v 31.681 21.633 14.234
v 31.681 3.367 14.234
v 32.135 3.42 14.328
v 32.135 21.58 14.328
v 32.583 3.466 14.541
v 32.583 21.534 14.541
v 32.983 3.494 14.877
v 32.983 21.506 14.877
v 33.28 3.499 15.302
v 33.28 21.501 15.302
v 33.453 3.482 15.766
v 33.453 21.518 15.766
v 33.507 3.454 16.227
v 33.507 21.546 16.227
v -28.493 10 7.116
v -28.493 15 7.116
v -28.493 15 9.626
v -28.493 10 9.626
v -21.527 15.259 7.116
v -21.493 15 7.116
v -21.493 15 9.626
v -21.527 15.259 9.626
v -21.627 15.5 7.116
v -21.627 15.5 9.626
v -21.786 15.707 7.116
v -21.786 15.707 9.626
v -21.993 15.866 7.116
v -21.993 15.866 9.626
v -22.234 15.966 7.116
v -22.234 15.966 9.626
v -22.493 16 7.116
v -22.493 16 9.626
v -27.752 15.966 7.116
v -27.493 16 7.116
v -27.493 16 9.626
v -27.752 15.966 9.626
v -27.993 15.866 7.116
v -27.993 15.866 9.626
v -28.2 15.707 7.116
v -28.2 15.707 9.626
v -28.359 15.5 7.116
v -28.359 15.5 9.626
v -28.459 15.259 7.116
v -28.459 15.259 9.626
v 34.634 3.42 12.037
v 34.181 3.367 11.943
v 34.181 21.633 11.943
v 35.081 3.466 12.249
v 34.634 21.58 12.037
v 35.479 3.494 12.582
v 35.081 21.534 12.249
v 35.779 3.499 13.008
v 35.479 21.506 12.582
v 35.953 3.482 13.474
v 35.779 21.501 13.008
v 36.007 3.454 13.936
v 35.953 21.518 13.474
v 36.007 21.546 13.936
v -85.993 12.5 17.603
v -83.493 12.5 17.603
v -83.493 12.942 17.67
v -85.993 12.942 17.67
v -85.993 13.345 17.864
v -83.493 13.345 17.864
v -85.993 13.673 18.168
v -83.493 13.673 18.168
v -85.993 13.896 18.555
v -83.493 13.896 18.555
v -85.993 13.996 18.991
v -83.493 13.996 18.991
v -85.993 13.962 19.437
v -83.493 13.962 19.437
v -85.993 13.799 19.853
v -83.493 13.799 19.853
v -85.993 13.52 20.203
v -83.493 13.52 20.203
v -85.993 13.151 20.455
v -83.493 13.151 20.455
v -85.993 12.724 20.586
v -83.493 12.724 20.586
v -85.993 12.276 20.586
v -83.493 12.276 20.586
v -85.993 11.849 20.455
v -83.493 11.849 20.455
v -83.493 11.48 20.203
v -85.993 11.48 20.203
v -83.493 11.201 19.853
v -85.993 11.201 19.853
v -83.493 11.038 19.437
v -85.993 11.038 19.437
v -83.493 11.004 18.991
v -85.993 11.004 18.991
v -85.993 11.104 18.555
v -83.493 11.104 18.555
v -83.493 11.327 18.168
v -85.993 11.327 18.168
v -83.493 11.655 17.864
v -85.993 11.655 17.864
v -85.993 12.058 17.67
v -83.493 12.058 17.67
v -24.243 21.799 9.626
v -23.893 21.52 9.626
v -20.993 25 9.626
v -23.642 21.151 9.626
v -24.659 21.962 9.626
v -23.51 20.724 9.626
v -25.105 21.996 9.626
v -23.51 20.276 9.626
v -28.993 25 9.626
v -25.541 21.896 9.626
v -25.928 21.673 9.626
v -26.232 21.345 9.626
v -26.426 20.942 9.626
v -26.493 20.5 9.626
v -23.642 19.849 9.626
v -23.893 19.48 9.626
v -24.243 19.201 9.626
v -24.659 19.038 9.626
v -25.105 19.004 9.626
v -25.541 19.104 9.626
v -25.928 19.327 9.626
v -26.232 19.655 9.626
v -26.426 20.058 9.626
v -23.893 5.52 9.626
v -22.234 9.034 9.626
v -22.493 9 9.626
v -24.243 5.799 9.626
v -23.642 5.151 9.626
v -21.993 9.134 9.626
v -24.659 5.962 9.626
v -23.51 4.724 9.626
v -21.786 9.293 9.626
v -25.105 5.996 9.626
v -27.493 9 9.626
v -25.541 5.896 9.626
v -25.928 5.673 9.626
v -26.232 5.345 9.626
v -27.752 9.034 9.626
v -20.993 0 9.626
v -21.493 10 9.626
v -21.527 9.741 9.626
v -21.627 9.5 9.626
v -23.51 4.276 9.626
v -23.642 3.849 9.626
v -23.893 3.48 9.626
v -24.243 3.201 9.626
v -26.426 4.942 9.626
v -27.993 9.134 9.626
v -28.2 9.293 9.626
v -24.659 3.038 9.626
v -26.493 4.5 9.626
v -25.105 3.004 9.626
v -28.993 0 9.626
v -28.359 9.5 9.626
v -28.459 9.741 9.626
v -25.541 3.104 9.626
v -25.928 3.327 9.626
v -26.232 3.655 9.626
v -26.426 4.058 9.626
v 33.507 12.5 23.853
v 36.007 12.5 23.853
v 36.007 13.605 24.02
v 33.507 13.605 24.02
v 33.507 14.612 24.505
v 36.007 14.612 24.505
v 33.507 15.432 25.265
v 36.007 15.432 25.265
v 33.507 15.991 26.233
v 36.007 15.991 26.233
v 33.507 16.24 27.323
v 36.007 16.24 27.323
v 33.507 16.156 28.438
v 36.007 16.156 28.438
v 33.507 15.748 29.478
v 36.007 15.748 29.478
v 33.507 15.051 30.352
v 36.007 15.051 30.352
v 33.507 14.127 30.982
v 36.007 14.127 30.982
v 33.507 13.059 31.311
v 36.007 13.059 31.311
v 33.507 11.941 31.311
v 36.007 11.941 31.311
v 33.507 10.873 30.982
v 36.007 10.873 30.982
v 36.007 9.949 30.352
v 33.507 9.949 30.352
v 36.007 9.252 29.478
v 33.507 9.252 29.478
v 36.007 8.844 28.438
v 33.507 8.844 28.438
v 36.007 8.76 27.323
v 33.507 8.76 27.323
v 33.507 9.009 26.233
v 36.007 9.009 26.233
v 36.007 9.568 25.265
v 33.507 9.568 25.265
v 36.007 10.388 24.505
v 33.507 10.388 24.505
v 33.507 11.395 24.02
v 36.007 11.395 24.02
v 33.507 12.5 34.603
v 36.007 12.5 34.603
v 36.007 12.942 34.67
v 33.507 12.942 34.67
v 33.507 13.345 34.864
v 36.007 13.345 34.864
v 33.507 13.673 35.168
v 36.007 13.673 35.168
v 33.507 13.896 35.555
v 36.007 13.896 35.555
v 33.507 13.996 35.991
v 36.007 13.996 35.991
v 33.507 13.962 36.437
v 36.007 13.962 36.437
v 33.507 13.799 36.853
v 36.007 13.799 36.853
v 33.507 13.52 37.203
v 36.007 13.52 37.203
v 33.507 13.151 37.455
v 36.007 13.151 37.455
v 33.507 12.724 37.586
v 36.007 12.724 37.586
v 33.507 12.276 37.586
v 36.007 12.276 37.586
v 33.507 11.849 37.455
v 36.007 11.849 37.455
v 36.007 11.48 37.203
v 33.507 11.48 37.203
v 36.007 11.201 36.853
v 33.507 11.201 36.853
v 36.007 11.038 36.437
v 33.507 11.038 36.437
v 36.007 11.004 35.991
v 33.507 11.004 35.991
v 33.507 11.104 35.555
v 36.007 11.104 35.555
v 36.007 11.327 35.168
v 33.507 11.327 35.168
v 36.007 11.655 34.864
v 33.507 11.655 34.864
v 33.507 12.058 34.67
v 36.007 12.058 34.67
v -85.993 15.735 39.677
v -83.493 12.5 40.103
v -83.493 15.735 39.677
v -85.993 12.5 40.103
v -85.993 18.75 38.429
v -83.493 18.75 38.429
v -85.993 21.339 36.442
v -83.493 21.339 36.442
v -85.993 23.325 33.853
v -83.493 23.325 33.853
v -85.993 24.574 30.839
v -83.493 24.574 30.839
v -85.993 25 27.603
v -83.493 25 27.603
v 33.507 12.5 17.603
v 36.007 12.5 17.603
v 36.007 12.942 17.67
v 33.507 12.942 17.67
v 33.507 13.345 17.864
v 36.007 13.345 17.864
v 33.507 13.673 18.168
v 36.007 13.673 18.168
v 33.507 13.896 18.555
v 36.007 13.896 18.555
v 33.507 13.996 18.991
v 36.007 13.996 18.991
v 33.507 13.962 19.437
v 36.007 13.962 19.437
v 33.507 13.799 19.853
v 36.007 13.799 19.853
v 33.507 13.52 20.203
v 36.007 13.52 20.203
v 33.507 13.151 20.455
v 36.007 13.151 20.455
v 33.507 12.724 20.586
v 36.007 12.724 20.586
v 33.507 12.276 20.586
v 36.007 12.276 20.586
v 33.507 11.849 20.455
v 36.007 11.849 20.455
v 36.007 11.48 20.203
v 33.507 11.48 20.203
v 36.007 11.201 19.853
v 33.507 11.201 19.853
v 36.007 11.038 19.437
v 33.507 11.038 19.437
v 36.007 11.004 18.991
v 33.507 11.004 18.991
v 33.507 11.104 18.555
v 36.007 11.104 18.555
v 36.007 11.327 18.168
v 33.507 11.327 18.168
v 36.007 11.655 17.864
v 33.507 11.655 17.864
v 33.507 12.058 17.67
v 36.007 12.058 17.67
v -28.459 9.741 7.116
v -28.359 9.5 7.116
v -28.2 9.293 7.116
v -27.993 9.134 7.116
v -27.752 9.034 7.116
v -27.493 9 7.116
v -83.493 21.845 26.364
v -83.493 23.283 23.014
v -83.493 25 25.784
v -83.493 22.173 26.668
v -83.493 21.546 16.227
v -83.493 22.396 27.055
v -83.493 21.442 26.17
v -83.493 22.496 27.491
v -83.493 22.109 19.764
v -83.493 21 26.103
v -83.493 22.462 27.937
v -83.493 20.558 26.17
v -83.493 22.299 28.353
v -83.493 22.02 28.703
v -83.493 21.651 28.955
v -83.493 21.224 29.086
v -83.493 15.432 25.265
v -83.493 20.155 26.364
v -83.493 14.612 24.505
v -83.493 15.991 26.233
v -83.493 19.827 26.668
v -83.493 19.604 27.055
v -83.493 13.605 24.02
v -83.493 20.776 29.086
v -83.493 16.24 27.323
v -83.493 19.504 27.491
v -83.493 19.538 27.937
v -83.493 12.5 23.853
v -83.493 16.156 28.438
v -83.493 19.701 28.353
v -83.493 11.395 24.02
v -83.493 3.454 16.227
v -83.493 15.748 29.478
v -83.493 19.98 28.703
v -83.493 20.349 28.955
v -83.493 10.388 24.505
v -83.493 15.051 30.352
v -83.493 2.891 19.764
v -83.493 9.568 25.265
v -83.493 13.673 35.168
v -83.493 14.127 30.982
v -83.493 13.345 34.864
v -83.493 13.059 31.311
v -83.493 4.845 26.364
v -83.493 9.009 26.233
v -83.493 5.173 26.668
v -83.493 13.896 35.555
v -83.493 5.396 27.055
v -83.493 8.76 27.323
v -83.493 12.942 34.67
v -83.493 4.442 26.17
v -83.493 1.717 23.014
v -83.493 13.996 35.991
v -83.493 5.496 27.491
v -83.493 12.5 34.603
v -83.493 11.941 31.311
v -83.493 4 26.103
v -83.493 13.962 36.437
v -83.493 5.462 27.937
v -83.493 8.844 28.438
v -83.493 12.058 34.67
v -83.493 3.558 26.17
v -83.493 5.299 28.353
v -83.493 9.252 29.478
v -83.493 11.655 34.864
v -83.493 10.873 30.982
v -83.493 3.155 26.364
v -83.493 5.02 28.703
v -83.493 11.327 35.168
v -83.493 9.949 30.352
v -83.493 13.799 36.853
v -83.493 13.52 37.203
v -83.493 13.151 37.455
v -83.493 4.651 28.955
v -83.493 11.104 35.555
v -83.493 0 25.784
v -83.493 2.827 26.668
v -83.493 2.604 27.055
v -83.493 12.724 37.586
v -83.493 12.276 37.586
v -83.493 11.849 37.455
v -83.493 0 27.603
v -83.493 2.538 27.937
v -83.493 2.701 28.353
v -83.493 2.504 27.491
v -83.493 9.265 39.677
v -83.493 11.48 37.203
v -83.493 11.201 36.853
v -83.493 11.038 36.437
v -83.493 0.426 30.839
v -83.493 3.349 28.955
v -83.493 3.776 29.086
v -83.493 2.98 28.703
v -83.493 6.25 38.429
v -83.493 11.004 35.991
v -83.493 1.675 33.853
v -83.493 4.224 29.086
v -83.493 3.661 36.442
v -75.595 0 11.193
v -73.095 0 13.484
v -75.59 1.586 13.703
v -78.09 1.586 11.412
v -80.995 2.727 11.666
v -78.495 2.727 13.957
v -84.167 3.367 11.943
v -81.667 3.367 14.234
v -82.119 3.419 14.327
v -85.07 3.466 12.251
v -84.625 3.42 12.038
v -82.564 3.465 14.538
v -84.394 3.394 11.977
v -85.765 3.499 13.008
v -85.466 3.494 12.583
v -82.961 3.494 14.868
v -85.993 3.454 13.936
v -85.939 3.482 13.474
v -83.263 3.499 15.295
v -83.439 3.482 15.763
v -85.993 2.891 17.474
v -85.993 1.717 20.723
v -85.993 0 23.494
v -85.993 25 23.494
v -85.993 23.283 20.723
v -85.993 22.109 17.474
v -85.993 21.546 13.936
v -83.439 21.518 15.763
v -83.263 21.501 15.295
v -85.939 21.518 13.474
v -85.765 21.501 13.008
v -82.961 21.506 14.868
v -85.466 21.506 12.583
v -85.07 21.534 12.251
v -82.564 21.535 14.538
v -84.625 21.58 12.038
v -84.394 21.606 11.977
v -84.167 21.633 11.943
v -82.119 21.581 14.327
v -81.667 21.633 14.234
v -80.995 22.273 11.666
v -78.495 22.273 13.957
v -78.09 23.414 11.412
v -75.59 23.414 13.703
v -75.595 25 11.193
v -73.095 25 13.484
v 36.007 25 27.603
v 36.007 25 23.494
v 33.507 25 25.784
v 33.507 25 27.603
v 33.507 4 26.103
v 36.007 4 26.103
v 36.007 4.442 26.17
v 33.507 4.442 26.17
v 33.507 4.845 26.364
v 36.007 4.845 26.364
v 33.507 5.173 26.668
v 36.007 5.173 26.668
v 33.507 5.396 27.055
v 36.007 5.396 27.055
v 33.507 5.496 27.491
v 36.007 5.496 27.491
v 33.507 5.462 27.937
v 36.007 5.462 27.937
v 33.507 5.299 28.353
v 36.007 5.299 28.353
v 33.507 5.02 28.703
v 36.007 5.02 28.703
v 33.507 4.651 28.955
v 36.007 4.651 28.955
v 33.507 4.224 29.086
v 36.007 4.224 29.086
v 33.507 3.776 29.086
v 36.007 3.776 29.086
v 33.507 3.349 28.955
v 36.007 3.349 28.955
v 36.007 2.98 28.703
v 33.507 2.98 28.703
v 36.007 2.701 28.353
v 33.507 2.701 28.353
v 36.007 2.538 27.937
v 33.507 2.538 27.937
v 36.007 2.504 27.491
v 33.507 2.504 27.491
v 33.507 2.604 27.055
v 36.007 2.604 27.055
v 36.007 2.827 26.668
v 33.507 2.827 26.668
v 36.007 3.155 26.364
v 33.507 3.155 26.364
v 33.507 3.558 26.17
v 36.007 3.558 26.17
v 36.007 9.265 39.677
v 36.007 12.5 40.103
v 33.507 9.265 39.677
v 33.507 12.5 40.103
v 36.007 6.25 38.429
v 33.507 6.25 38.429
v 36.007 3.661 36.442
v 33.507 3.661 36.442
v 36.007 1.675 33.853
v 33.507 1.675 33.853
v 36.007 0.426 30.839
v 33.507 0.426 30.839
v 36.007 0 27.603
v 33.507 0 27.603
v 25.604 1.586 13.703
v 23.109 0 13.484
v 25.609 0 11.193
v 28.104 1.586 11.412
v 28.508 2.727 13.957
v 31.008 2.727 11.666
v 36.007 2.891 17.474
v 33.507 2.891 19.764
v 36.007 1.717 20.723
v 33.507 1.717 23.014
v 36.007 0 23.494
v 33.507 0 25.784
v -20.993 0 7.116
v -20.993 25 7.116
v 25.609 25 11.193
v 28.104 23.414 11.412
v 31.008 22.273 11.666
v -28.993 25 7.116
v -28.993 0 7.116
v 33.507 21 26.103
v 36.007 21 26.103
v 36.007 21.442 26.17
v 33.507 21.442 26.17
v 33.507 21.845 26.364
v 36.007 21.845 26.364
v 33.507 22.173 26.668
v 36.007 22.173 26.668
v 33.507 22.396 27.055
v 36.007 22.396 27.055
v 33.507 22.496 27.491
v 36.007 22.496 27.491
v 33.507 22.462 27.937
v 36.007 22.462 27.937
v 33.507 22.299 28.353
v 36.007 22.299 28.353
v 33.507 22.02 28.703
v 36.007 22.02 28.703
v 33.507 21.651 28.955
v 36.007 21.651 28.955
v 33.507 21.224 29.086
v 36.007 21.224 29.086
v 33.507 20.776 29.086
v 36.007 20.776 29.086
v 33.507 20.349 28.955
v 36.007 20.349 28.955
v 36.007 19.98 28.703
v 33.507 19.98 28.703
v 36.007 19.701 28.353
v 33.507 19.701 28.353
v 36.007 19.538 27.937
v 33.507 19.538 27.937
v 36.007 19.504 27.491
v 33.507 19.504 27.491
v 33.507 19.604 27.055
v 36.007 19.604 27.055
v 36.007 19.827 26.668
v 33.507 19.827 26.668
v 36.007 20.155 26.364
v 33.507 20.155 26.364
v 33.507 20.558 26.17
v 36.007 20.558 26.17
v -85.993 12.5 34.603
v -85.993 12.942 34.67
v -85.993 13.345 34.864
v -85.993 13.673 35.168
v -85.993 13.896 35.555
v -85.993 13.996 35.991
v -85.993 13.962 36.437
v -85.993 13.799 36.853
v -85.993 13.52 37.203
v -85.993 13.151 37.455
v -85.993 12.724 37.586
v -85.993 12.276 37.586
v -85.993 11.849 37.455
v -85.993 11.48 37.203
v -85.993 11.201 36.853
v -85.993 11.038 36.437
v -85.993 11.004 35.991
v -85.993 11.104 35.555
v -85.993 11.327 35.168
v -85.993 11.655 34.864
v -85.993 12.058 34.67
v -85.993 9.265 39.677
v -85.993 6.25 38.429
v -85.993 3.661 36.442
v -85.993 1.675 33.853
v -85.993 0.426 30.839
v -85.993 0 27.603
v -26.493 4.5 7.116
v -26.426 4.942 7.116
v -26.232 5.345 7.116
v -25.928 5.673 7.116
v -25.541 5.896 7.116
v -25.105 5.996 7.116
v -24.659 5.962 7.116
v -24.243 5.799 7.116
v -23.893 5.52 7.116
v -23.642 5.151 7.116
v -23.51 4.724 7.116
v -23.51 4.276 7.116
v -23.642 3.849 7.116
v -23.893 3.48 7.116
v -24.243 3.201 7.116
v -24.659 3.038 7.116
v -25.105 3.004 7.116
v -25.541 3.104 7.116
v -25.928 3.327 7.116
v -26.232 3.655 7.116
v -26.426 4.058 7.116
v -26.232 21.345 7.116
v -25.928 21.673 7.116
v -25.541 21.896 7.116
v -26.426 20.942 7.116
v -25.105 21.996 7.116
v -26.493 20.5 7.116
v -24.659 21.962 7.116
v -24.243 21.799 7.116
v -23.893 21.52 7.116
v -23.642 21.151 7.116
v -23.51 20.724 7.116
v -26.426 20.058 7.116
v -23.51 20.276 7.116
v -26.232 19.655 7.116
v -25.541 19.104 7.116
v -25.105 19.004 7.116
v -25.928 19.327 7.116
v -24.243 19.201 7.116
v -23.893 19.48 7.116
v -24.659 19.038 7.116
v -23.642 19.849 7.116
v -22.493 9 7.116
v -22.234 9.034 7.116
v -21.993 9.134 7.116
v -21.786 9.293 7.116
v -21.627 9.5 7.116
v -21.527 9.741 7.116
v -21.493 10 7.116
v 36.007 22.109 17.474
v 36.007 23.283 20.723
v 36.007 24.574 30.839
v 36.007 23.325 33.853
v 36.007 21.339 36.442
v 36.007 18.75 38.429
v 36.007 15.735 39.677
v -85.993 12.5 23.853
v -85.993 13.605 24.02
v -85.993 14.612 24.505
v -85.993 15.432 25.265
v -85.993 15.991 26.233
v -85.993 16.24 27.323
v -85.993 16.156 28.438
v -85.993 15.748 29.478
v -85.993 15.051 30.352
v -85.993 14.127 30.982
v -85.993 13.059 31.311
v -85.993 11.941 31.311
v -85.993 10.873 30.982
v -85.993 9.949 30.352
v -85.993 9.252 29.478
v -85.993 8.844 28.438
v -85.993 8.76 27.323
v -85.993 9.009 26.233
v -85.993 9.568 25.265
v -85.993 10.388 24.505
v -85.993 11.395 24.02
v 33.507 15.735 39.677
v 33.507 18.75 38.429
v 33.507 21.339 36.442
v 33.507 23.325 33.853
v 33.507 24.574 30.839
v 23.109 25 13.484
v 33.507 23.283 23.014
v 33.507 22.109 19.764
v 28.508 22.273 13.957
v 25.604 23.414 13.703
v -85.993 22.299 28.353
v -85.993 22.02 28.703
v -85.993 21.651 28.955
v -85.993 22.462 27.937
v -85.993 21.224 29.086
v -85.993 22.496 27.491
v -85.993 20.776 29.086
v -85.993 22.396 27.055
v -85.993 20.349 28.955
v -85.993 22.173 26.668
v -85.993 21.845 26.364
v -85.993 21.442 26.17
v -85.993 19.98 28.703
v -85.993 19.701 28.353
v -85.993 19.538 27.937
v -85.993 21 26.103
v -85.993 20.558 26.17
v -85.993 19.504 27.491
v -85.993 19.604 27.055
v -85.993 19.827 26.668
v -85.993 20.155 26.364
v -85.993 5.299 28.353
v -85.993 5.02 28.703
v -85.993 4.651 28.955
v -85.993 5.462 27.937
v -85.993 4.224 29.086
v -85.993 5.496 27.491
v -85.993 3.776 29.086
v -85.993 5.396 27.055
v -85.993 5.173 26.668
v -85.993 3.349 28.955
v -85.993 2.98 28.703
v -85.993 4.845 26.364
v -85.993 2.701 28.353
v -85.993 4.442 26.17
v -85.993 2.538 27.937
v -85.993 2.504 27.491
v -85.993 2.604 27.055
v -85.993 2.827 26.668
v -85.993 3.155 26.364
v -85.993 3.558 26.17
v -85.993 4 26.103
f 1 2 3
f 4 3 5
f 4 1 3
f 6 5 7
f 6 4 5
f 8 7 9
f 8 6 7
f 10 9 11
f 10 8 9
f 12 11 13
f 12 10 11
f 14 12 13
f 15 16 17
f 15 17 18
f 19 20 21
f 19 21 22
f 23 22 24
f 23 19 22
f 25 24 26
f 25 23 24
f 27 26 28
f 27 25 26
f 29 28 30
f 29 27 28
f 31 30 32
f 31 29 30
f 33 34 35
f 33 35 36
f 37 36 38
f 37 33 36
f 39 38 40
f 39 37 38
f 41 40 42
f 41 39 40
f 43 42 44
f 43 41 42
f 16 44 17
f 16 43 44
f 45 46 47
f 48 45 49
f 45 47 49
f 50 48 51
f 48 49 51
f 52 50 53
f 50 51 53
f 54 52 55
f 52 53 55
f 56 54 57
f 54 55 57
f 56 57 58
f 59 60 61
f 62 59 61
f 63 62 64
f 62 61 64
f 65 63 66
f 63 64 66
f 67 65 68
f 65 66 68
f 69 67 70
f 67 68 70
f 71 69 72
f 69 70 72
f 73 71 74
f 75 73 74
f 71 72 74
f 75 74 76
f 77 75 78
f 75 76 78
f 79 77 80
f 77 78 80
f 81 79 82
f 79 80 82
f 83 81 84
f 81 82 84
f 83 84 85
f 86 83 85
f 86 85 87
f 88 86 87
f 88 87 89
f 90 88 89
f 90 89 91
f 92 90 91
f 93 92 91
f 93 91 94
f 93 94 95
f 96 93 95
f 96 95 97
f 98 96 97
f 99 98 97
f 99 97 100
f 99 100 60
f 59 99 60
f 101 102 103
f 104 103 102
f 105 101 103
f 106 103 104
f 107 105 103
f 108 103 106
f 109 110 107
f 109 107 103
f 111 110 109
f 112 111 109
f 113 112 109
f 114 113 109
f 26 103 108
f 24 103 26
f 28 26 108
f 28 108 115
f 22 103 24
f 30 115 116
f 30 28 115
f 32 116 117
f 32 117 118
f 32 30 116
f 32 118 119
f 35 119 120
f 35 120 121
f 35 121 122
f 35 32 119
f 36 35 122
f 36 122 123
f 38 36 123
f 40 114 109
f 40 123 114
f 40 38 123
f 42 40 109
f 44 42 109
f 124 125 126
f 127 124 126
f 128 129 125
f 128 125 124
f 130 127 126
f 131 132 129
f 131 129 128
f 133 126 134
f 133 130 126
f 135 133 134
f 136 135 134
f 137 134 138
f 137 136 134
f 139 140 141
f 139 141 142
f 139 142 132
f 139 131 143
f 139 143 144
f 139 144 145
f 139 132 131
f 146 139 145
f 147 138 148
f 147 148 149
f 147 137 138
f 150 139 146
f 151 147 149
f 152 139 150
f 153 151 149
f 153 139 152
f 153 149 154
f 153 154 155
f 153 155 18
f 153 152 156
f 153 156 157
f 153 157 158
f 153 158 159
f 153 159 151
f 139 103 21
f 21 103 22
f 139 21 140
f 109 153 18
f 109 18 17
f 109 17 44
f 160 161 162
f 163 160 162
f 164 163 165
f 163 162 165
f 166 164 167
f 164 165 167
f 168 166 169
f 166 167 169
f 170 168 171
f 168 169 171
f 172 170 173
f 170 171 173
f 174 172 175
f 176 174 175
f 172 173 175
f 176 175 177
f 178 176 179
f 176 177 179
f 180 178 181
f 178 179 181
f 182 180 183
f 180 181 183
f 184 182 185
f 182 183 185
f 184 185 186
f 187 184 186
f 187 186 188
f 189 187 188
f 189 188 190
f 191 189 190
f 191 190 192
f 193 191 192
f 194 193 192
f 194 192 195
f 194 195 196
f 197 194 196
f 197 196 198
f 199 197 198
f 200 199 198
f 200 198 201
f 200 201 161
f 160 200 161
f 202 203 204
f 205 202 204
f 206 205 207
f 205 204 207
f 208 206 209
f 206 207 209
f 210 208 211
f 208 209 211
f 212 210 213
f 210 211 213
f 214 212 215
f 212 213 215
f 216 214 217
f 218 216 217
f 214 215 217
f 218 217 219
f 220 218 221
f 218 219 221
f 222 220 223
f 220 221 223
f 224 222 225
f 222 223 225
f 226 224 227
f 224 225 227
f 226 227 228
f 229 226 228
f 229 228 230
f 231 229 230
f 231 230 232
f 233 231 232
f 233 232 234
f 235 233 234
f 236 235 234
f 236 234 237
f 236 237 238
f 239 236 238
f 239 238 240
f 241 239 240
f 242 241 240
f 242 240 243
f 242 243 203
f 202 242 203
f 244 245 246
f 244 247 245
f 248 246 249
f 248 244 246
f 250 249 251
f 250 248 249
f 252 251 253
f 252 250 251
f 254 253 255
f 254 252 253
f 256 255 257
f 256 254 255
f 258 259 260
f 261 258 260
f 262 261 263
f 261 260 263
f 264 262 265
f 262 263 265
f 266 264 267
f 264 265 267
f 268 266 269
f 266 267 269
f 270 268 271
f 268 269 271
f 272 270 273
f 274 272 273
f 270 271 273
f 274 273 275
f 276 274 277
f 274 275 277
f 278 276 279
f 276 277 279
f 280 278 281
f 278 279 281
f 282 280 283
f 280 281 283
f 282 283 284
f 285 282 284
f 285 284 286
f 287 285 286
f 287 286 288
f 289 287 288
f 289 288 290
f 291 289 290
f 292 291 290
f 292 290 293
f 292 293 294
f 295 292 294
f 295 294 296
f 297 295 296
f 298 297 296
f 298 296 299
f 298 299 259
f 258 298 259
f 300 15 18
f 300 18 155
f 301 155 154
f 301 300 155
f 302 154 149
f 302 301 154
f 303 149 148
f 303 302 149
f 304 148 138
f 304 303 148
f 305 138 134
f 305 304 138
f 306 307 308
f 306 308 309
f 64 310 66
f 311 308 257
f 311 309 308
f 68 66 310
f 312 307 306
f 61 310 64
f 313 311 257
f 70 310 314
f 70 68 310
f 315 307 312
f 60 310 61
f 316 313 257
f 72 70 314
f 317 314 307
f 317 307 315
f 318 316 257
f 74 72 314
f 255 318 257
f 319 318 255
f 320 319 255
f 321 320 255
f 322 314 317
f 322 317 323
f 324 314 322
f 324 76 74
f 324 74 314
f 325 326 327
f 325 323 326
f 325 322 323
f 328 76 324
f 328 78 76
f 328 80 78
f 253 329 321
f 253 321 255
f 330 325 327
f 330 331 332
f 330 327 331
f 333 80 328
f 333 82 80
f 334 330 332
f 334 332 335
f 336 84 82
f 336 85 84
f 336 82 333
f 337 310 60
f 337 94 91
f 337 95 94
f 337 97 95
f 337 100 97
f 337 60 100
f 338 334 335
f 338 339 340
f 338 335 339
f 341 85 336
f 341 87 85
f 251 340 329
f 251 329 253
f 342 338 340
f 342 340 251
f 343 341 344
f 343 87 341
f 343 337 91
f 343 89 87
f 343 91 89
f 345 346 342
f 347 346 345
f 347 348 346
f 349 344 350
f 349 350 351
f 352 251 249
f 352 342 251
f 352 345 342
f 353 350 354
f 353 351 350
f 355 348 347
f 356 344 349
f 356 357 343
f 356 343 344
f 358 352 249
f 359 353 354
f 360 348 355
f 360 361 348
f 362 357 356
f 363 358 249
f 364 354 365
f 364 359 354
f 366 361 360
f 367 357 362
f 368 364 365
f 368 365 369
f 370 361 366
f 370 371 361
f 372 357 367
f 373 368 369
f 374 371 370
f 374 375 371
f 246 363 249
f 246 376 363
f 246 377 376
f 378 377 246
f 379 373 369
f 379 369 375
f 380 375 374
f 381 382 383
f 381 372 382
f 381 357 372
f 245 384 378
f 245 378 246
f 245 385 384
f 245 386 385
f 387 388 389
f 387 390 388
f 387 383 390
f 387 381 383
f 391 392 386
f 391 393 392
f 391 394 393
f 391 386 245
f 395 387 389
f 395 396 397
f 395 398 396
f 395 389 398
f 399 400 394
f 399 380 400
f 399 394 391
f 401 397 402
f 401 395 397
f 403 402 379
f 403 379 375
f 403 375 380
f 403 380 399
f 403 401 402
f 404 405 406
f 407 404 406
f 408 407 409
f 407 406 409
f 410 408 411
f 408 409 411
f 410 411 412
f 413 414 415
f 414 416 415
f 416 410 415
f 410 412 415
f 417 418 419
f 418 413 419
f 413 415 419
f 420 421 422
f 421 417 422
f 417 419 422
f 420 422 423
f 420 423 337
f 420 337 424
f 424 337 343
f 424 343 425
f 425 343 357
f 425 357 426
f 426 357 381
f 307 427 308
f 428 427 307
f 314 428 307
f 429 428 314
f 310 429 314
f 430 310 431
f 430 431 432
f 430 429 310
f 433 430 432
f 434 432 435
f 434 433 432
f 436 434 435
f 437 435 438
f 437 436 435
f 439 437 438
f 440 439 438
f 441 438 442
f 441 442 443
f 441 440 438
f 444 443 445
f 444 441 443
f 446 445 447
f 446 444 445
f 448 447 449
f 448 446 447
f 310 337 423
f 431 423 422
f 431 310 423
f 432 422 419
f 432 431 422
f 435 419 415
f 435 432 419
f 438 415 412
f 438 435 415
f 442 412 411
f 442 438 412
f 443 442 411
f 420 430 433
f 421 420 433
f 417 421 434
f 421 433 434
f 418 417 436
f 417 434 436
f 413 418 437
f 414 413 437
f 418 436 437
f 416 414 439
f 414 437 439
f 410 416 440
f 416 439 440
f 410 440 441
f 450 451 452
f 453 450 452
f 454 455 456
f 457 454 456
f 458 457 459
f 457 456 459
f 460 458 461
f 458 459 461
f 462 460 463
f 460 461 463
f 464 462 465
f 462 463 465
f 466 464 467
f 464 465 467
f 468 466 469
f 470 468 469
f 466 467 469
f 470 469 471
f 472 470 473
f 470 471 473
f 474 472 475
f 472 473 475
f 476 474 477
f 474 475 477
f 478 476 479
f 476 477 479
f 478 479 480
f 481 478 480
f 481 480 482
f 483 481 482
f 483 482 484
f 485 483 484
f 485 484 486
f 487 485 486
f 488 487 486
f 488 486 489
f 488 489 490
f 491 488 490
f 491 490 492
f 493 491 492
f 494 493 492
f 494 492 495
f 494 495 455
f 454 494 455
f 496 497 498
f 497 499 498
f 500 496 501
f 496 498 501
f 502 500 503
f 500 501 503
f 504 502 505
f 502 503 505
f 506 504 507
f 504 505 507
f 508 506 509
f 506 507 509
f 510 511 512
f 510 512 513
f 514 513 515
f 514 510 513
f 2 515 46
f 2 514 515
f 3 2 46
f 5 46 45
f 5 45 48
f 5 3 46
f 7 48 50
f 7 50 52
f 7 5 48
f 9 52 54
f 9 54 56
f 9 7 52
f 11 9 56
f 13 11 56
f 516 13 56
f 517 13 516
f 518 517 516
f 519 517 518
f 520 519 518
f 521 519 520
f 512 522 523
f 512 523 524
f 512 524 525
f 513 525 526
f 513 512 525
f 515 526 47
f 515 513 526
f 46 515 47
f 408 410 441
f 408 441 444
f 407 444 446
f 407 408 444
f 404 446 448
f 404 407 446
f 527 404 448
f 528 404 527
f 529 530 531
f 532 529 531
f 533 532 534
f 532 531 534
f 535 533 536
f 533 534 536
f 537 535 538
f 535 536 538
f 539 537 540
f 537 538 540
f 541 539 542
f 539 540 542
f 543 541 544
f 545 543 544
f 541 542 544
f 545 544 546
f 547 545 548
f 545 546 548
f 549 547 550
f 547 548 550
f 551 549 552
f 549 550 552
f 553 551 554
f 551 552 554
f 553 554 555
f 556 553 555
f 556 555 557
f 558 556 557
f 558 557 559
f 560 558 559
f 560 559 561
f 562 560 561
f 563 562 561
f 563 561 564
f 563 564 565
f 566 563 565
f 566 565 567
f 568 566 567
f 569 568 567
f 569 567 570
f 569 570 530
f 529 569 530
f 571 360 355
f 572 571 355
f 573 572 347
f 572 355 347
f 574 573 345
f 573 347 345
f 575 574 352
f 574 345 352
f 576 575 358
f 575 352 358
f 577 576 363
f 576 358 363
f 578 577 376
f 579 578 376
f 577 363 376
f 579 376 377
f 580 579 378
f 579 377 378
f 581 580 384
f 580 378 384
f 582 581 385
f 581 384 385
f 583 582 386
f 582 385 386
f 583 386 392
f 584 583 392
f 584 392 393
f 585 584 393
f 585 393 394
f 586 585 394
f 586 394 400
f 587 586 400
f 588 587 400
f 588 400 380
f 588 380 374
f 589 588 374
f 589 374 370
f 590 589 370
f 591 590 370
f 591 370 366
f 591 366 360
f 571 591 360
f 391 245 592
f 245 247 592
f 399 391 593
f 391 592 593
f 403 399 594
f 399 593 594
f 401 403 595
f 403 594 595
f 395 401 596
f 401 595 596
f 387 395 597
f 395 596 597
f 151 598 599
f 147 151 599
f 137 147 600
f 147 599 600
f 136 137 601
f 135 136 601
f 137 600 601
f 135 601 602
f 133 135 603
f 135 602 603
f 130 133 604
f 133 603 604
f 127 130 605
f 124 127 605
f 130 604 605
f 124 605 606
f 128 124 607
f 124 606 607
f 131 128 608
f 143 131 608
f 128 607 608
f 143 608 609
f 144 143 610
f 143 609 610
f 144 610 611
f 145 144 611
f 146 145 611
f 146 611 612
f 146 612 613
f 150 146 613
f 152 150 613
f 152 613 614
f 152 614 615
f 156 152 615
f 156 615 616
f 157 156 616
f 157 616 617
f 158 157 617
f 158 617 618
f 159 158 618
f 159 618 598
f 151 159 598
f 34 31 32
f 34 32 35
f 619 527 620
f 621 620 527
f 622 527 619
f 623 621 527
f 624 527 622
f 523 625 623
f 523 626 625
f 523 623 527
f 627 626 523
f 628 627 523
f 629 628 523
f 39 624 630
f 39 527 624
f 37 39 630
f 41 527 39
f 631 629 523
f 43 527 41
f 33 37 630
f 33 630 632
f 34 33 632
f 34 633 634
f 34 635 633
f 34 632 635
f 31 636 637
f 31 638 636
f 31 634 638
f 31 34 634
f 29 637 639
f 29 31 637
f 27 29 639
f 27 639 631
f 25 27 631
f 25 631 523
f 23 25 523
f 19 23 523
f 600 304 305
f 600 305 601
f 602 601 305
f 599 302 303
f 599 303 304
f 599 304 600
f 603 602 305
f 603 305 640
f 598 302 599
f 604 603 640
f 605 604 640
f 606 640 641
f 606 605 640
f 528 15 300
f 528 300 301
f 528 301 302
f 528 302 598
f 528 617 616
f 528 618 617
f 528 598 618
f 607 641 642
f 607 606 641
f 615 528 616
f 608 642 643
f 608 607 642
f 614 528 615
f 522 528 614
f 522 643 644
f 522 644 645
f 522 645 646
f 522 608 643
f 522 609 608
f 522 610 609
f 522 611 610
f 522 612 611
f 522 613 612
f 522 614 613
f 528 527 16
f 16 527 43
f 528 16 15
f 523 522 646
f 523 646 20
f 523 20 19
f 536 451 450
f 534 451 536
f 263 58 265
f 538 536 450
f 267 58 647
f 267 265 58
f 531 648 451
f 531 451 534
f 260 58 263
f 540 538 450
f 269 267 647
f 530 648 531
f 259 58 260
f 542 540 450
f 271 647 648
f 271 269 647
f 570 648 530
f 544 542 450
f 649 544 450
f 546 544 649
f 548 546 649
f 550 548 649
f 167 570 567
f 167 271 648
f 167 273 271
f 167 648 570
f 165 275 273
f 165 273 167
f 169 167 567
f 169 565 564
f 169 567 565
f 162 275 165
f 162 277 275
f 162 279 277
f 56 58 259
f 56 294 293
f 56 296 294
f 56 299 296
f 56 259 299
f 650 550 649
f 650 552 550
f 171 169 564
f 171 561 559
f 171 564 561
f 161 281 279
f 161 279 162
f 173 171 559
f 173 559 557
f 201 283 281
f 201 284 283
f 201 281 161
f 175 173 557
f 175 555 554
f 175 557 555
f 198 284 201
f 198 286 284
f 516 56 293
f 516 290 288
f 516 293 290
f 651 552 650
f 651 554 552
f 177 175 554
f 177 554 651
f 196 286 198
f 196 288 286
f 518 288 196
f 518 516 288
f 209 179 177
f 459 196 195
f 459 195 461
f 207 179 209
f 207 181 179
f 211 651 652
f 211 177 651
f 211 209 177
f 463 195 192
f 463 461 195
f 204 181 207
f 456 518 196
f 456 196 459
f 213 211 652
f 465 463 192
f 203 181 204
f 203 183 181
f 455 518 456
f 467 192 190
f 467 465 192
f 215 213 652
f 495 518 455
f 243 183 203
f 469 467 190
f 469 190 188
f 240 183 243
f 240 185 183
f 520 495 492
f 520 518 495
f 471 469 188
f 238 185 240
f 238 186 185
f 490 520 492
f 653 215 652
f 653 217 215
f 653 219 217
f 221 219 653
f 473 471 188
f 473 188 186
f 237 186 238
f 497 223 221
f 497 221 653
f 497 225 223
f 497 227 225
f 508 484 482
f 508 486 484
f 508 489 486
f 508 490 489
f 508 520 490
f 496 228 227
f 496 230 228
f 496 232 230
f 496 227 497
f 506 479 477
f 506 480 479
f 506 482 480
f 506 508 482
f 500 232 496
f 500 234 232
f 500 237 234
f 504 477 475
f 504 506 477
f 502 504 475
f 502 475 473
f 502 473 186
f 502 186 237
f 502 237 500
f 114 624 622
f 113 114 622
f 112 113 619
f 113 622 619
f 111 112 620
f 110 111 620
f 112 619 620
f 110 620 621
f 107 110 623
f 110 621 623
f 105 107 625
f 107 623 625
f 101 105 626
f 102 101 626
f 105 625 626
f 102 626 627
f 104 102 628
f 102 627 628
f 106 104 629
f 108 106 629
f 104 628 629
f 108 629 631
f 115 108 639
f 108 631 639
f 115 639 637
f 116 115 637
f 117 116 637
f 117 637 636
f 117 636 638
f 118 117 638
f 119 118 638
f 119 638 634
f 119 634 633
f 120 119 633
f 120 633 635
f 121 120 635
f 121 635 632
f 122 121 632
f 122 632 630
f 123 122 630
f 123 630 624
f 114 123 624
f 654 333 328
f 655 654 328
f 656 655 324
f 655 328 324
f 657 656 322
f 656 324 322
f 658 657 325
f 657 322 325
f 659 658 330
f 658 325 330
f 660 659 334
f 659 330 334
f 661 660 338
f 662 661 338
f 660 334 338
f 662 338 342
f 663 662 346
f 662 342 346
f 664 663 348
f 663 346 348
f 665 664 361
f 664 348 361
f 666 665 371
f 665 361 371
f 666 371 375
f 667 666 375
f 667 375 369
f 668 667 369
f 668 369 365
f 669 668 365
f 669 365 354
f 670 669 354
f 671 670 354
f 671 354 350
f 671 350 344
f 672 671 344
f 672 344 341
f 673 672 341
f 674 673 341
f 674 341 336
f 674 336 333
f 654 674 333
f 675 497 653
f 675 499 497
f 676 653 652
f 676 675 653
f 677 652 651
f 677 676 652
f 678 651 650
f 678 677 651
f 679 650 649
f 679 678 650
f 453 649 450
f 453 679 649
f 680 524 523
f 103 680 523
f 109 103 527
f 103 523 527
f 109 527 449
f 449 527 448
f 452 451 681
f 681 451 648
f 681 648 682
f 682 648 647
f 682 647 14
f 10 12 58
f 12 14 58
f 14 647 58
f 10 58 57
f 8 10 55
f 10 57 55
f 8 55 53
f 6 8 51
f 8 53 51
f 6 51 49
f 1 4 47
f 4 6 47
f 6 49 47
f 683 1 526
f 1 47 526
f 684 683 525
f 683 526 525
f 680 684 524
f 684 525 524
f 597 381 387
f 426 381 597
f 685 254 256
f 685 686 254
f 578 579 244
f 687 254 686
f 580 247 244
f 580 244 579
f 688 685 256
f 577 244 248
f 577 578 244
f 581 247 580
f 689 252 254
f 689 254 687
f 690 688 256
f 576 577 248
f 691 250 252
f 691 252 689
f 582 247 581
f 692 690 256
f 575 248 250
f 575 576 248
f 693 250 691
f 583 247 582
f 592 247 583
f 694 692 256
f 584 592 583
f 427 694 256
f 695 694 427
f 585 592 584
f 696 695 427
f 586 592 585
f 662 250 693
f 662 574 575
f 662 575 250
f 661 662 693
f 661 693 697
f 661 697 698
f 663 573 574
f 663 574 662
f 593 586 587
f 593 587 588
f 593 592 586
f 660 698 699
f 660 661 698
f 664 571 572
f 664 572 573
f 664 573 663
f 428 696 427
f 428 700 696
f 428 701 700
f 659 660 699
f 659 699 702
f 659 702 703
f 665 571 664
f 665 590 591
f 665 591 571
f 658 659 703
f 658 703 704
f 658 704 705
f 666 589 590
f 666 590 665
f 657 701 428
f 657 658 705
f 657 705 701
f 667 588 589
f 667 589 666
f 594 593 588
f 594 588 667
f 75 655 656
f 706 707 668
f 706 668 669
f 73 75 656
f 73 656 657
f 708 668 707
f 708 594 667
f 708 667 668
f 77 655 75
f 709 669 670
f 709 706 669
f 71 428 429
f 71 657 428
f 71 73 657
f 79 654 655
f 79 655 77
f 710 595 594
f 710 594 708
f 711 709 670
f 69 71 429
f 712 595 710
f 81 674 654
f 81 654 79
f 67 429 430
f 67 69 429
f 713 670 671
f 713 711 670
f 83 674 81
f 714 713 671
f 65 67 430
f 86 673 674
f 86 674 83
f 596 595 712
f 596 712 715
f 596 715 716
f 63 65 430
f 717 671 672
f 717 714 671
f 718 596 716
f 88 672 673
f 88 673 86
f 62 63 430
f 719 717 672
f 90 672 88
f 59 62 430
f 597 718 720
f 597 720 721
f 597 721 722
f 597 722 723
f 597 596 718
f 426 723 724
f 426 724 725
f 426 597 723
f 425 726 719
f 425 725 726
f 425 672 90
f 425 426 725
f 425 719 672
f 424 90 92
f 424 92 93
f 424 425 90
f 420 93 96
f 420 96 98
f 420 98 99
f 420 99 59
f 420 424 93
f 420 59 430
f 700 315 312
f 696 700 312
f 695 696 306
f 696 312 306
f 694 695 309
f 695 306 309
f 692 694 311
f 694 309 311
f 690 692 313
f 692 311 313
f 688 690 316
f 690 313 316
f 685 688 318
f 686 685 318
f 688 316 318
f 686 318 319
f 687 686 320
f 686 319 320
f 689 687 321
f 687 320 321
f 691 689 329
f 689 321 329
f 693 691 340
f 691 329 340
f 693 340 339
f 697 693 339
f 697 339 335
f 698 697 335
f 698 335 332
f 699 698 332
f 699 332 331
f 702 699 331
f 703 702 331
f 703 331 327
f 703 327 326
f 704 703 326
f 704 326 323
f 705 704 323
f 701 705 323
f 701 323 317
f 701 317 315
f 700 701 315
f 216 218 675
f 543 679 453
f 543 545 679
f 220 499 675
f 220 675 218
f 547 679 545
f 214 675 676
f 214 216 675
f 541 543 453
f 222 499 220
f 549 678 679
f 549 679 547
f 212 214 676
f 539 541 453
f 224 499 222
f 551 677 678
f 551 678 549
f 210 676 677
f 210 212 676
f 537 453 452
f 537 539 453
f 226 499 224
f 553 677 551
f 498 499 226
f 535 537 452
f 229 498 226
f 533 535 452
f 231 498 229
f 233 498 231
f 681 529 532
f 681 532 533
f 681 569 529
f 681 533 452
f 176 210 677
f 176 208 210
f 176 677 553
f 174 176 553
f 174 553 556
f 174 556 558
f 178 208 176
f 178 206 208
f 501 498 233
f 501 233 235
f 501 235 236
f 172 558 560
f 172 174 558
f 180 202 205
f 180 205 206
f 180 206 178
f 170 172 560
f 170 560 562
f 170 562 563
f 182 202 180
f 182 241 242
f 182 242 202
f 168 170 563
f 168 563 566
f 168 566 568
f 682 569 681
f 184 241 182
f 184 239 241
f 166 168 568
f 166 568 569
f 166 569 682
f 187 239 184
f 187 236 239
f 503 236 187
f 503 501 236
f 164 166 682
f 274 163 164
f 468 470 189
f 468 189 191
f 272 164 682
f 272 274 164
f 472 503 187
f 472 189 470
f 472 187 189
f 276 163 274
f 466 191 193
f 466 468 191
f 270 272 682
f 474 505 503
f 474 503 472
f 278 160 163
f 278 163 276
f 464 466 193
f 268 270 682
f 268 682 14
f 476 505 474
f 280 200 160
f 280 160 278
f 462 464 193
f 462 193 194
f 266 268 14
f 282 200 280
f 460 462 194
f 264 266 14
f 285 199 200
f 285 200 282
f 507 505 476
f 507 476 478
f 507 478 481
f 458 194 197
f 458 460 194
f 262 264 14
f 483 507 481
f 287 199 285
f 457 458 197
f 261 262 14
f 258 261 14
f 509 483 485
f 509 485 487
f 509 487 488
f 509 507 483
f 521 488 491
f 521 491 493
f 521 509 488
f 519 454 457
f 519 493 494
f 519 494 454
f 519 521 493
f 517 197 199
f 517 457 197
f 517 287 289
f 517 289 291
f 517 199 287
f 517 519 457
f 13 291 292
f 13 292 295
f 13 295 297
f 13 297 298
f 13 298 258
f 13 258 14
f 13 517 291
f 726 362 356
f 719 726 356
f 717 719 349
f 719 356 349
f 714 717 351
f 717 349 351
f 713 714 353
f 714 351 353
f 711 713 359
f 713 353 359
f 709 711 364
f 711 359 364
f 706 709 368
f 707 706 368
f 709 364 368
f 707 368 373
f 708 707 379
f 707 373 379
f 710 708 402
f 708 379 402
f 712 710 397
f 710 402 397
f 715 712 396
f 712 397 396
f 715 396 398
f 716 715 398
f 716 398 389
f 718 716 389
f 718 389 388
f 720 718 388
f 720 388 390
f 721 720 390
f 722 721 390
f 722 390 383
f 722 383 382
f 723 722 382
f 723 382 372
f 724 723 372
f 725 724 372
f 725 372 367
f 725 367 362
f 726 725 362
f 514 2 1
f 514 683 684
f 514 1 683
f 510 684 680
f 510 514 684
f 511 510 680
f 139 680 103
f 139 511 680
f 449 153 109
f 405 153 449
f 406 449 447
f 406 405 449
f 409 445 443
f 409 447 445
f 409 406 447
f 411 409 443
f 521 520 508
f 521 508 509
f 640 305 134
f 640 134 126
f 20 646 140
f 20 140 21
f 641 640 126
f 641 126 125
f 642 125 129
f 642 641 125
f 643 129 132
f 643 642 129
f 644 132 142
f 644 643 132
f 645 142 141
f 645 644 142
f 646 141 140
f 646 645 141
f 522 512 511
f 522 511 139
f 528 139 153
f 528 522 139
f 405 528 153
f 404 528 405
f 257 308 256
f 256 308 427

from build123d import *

# Parameters (mm, degrees)
RESSALTO_EXTRUS_O1_DEPTH = 25
FILETE1_R                = 12.5
FILETE2_R                = 2
ESBO_O2_R                = 1.5
CORTE_EXTRUS_O1_DEPTH    = 10
ESBO_O3_R                = 3.75
ESBO_O3_R_2              = 1.5
CORTE_EXTRUS_O2_DEPTH    = 131.832972904
ESBO_O4_R                = 11
CORTE_EXTRUS_O5_DEPTH    = 17


with BuildPart() as part:
    # Esboço1 → Ressalto-extrusão1 (new body)
    with BuildSketch(Plane(origin=(0, 0, 0), x_dir=(1, 0, 0), z_dir=(0, 1, 0))):
        Polygon((-83.493030157, -40.103201854), (-85.993030157, -40.103201854), (-85.993030157, -12.103201854), (-28.993030157, -7.116348033), (-20.993030157, -7.116348033), (36.006969843, -12.103201854), (36.006969843, -40.103201854), (33.506969843, -40.103201854), (33.506969843, -14.394029789), (-20.993030157, -9.625897627), (-28.993030157, -9.625897627), (-83.493030157, -14.394029789), align=None)
    extrude(amount=RESSALTO_EXTRUS_O1_DEPTH)

    # Filete1
    filete1_edges = [part.edges().sort_by_distance(p)[0] for p in [
        (34.756969843, 25, 40.103201854),
        (34.756969843, 0, 40.103201854),
        (-84.743030157, 0, 40.103201854),
        (-84.743030157, 25, 40.103201854),
    ]]
    fillet(filete1_edges, radius=FILETE1_R - 0.0001)  # a hair under: the kernel refuses the full size

    # Filete2
    filete2_edges = [part.edges().sort_by_distance(p)[0] for p in [
        (-85.993030157, 12.5, 12.103201854),
        (36.006969843, 12.5, 12.103201854),
        (33.506969843, 12.5, 14.394029789),
        (-83.493030157, 12.5, 14.394029789),
    ]]
    fillet(filete2_edges, radius=FILETE2_R)

    # Esboço2 → Corte-extrusão1 (cut)
    with BuildSketch(Plane(origin=(0, 0, 7.116348033), x_dir=(-1, 0, 0), z_dir=(0, 0, -1))):
        with Locations((24.993030157, 4.5)):
            Circle(ESBO_O2_R)
        with Locations((24.993030157, 20.5)):
            Circle(ESBO_O2_R)
        with BuildLine():
            Line((27.493030157, 9), (22.493030157, 9))
            ThreePointArc((22.493030157, 9), (21.785923376, 9.292893219), (21.493030157, 10))
            Line((21.493030157, 10), (21.493030157, 15))
            ThreePointArc((21.493030157, 15), (21.785923376, 15.707106781), (22.493030157, 16))
            Line((22.493030157, 16), (27.493030157, 16))
            ThreePointArc((27.493030157, 16), (28.200136938, 15.707106781), (28.493030157, 15))
            Line((28.493030157, 15), (28.493030157, 10))
            ThreePointArc((28.493030157, 10), (28.200136938, 9.292893219), (27.493030157, 9))
        make_face()
    extrude(amount=-CORTE_EXTRUS_O1_DEPTH, mode=Mode.SUBTRACT)

    # Esboço3 → Corte-extrusão2 (cut, through all)
    with BuildSketch(Plane(origin=(36.006969843, 0, 0), x_dir=(0, 0, -1), z_dir=(1, 0, 0))):
        with Locations((-27.603201854, 12.5)):
            Circle(ESBO_O3_R)
        with Locations((-36.103201854, 12.5)):
            Circle(ESBO_O3_R_2)
        with Locations((-19.103201854, 12.5)):
            Circle(ESBO_O3_R_2)
        with Locations((-27.603201854, 4)):
            Circle(ESBO_O3_R_2)
        with Locations((-27.603201854, 21)):
            Circle(ESBO_O3_R_2)
    extrude(amount=-CORTE_EXTRUS_O2_DEPTH, mode=Mode.SUBTRACT)

    # Esboço4 → Corte-extrusão5 (cut, symmetric)
    with BuildSketch(Plane(origin=(-39.80249127, 0, -36.472263554), x_dir=(0.6755902076156622, 0, -0.7372773368101223), z_dir=(0.7372773368101223, 0, 0.6755902076156622))):
        with Locations((-67.370645943, 32.5)):
            Circle(ESBO_O4_R)
        with Locations((-67.370645943, -7.5)):
            Circle(ESBO_O4_R)
    corte_extrus_o5 = extrude(amount=CORTE_EXTRUS_O5_DEPTH, both=True, mode=Mode.SUBTRACT)

    # Espelhar1: Corte-extrusão5 across plane
    add(corte_extrus_o5.mirror(Plane(origin=(-24.993030157, 0, 0), x_dir=(0, 0, 1), z_dir=(1, 0, 0))), mode=Mode.SUBTRACT)


solid = part.part
